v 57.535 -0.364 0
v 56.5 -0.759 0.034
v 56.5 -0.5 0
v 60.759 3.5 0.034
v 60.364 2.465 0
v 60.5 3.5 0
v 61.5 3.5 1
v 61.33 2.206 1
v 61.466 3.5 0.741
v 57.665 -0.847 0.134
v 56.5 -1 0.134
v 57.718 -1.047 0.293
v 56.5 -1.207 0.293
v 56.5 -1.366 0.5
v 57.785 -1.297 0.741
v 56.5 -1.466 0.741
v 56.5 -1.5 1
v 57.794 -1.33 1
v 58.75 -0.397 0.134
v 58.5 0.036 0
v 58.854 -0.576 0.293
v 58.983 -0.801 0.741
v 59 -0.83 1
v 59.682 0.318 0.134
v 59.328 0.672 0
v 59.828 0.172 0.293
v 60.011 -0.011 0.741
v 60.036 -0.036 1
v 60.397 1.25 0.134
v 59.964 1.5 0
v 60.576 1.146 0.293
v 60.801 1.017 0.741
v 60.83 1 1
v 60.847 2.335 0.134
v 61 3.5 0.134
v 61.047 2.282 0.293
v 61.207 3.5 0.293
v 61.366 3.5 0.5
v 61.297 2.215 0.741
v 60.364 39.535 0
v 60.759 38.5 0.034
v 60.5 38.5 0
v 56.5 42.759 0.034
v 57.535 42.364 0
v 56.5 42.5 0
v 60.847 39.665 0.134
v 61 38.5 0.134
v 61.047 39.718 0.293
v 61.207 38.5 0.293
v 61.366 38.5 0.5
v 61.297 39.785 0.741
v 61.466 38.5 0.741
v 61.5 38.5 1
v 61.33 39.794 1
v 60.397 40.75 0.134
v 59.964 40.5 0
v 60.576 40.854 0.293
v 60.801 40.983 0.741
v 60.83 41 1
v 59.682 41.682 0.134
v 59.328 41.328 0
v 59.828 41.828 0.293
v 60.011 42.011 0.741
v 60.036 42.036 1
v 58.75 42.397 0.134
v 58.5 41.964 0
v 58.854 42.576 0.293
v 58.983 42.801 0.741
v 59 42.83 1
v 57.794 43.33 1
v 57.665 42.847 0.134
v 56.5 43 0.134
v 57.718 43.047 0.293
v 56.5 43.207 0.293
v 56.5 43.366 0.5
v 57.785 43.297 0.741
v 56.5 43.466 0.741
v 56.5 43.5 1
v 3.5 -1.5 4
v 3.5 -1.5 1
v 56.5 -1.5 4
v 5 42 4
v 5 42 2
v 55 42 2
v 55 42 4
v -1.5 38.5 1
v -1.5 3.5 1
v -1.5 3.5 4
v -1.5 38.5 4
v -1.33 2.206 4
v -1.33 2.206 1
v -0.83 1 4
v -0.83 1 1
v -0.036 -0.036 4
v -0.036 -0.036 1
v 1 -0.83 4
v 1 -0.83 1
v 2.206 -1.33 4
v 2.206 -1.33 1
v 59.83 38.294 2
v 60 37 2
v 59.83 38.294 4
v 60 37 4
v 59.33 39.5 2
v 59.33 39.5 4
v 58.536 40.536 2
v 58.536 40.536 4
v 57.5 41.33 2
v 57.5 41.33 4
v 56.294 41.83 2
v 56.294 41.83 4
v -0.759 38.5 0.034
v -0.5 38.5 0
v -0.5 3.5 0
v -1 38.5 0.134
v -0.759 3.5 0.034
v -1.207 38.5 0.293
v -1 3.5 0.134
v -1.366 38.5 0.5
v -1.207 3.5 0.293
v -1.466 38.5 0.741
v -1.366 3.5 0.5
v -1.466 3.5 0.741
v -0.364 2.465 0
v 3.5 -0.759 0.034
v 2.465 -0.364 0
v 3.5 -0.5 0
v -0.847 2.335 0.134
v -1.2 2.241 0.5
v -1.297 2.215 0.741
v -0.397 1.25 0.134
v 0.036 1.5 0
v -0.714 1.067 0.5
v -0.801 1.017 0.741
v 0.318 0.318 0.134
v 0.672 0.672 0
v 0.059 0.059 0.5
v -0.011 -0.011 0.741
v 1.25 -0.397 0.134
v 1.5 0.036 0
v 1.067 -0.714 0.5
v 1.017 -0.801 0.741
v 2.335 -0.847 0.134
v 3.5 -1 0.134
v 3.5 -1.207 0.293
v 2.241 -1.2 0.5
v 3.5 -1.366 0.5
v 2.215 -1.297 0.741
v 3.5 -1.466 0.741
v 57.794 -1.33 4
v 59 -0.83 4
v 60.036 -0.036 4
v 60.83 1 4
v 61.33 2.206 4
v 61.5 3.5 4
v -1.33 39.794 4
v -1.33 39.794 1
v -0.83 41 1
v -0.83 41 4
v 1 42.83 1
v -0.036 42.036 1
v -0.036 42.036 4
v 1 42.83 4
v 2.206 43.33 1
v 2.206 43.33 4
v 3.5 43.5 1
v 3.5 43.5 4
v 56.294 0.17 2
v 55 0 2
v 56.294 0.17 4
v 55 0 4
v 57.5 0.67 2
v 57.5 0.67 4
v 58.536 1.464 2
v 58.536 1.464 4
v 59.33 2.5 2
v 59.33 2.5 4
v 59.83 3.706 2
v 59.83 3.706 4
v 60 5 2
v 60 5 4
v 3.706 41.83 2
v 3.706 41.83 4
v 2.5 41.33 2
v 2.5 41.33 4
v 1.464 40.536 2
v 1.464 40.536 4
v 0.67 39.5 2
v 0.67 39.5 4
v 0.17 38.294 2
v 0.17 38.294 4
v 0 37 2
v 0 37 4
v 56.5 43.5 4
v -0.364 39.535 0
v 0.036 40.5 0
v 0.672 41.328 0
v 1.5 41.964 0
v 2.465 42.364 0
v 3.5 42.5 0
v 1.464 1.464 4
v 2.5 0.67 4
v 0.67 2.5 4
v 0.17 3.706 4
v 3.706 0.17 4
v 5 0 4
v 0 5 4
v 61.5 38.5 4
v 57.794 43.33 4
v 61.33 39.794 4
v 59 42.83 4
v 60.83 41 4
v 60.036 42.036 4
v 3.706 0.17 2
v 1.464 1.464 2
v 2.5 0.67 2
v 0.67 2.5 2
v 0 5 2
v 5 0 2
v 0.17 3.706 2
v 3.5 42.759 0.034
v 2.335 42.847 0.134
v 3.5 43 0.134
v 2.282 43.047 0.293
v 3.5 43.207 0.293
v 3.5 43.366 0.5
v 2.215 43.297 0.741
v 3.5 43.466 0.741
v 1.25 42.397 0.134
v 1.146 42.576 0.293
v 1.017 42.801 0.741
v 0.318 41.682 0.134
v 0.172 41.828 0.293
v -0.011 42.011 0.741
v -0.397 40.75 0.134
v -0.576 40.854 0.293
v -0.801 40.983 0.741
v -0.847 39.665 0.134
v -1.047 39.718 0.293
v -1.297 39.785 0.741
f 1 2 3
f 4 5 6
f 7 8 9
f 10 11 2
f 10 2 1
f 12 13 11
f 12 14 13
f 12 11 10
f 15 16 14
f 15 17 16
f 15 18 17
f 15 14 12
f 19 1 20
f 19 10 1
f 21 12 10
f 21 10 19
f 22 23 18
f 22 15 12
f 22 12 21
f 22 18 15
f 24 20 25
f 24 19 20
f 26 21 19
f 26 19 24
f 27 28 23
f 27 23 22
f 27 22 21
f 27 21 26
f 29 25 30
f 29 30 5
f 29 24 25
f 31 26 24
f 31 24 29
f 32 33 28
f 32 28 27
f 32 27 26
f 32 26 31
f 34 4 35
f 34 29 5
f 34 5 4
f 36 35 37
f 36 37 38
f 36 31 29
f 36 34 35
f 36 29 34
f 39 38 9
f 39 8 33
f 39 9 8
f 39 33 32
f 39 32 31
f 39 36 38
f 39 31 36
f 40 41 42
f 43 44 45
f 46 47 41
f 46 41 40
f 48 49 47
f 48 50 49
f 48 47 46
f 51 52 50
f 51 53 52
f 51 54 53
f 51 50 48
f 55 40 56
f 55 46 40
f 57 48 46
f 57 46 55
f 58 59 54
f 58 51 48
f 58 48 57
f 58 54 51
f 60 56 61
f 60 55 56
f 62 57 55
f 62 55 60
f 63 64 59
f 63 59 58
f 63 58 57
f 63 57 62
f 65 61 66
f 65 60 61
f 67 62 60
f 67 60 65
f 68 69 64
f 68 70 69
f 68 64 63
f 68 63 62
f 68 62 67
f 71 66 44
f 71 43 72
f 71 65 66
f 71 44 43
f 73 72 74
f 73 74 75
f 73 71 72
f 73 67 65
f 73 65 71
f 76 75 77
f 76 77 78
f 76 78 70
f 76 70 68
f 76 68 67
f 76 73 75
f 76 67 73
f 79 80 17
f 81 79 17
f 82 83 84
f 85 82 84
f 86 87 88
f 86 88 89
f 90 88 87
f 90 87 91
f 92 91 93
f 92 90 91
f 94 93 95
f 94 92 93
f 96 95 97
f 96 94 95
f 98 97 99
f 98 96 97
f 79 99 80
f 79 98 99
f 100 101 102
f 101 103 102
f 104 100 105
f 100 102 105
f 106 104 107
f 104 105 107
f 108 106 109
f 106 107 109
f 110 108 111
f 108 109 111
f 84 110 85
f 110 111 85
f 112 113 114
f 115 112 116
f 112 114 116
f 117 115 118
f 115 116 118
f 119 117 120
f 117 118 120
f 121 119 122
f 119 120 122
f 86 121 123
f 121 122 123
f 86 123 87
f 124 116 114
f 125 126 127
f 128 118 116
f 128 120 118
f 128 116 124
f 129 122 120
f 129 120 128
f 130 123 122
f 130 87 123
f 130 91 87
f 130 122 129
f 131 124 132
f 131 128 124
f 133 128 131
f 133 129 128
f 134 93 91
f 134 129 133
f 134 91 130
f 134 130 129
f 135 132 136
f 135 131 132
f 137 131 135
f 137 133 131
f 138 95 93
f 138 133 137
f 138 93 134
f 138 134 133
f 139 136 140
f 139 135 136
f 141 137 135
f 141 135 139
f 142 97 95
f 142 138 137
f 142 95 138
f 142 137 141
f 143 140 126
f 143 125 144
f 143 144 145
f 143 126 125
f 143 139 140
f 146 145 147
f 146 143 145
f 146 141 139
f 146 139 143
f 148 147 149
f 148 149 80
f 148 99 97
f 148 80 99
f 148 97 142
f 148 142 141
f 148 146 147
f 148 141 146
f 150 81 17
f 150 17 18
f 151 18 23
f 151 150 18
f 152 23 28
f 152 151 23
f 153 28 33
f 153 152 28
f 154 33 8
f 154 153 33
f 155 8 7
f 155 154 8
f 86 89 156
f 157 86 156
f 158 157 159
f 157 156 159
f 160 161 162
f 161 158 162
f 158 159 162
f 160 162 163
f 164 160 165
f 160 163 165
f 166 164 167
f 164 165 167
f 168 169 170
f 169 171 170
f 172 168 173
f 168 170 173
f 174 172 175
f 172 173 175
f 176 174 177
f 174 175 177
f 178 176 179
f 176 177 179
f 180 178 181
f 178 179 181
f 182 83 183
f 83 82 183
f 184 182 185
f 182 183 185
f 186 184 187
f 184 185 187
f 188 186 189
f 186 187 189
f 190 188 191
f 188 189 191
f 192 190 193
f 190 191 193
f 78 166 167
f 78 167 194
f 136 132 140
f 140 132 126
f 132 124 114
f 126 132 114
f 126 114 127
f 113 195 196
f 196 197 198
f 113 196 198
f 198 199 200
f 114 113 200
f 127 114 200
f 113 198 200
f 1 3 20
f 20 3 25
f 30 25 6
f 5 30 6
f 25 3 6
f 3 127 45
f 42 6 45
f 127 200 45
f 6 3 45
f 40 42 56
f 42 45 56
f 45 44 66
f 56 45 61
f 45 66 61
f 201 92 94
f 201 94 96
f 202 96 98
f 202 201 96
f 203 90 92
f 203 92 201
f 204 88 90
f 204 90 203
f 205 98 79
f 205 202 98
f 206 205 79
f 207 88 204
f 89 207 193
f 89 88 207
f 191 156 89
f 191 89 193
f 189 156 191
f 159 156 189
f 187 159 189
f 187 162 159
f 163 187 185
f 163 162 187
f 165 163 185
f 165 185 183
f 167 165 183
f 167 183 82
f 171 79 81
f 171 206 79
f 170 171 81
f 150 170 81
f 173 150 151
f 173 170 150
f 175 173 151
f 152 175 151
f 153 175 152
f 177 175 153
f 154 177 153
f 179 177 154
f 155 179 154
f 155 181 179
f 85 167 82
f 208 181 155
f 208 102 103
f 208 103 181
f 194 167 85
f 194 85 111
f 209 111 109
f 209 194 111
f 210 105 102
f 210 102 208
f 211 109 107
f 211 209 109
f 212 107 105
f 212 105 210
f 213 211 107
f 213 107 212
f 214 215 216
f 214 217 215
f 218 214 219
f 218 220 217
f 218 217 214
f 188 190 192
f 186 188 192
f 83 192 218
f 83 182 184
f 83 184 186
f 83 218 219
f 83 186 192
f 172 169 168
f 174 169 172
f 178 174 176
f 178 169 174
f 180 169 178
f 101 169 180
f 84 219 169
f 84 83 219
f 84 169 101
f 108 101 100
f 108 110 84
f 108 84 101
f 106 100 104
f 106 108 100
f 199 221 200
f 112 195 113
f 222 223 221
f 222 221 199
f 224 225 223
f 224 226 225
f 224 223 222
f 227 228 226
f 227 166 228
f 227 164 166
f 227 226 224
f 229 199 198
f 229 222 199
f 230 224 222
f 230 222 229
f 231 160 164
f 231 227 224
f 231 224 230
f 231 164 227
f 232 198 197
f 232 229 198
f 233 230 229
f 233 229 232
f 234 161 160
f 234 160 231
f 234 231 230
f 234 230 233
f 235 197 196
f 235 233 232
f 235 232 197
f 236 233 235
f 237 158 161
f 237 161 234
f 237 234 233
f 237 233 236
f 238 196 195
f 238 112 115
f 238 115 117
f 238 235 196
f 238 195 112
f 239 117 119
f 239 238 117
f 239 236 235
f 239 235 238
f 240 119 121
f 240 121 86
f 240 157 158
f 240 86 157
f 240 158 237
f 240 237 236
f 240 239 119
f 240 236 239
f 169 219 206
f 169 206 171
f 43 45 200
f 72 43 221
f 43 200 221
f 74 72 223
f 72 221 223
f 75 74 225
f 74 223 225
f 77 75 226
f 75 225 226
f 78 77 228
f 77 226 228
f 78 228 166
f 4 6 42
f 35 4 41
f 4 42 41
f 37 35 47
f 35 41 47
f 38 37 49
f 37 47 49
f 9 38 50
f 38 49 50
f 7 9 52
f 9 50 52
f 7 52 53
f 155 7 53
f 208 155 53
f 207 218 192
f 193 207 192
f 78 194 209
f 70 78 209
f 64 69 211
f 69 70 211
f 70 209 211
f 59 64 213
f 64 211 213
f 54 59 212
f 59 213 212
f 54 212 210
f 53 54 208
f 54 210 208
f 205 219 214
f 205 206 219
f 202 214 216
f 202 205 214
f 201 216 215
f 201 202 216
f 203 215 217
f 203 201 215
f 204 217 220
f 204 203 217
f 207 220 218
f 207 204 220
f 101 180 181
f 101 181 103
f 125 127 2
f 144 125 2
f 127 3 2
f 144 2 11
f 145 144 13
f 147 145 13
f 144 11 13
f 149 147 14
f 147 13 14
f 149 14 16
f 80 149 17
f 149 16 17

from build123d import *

# Parameters (mm, degrees)
F0_W     = 60
F0_H     = 42
F1_DEPTH = 2
F2_W     = 63
F2_H     = 45
F2_W_2   = 60
F2_H_2   = 42
F3_DEPTH = 4
F4_R     = 5
F5_R     = 1


with BuildPart() as f1:
    # F0 (on Top) → F1 (new body)
    with BuildSketch(Plane.XY):
        with Locations((30, 21)):
            Rectangle(F0_W, F0_H)
    extrude(amount=F1_DEPTH)

    # F2 (on Top) → F3 (join)
    with BuildSketch(Plane.XY):
        with Locations((30, 21)):
            Rectangle(F2_W, F2_H)
        with Locations((30, 21)):
            Rectangle(F2_W_2, F2_H_2, mode=Mode.SUBTRACT)
    extrude(amount=F3_DEPTH)

    # F4
    f4_edges = [f1.edges().sort_by_distance(p)[0] for p in [
        (-1.5, -1.5, 2),
        (61.5, -1.5, 2),
        (-1.5, 43.5, 2),
        (60, 42, 3),
        (61.5, 43.5, 2),
        (60, 0, 3),
        (0, 0, 3),
        (0, 42, 3),
    ]]
    fillet(f4_edges, radius=F4_R)

    # F5
    f5_edges = [f1.edges().sort_by_distance(p)[0] for p in [
        (30, -1.5, 0),
        (60.035534, -0.035534, 0),
        (61.5, 21, 0),
        (60.035534, 42.035534, 0),
        (30, 43.5, 0),
        (-0.035534, 42.035534, 0),
        (-1.5, 21, 0),
        (-0.035534, -0.035534, 0),
    ]]
    fillet(f5_edges, radius=F5_R)


solid = f1.part
